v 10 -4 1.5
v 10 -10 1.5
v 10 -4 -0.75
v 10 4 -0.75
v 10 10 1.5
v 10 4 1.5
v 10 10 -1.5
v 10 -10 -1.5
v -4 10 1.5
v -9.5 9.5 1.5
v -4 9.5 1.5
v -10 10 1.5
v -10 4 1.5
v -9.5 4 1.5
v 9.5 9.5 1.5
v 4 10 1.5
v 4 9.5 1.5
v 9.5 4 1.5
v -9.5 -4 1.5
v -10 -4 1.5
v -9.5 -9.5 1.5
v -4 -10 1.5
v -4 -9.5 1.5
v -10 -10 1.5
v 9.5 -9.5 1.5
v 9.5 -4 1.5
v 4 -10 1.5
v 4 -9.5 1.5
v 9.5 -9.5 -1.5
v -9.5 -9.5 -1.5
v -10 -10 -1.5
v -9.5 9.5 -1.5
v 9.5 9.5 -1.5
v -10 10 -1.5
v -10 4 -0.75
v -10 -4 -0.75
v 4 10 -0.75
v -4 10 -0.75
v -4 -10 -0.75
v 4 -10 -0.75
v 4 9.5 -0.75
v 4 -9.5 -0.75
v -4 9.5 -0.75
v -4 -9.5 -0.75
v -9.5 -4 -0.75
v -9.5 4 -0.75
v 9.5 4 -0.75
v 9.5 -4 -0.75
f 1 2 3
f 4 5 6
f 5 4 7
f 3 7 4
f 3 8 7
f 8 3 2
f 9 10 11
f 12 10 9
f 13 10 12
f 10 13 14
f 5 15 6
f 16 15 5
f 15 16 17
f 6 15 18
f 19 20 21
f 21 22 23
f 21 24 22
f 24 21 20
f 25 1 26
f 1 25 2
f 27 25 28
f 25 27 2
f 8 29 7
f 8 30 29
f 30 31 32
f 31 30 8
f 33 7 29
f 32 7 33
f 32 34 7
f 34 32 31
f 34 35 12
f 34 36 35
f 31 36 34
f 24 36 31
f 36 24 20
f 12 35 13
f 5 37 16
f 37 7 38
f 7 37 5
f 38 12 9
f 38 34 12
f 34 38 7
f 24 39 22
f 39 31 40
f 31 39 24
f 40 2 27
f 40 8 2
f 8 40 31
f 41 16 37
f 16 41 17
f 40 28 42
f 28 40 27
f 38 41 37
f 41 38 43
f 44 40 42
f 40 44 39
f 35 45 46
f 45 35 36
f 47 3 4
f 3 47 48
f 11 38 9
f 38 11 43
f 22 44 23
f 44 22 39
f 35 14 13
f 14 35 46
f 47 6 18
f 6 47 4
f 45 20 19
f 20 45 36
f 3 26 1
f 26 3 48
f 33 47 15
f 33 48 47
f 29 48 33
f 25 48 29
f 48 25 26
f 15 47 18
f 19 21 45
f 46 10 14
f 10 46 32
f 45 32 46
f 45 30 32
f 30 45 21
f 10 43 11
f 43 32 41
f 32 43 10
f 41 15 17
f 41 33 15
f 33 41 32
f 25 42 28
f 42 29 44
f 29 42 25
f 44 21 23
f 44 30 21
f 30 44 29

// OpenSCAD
length=20;
height=3;
width=20;
proportion=2.5;
wallthickness=1;
bottomthickness=.2;

difference(){
    cube(size=[length,width,height],center=true);
    
    
    translate([0,-width/proportion,height/4])
         cube(size=[length/proportion,width*4,height],center=true);
    translate([-length/proportion,0,height/4])
         cube(size=[length*4,width/proportion,height],center=true);
    translate([0,0,bottomthickness])
         cube(size=[length-wallthickness,width-wallthickness,height*2],center=true);
};
